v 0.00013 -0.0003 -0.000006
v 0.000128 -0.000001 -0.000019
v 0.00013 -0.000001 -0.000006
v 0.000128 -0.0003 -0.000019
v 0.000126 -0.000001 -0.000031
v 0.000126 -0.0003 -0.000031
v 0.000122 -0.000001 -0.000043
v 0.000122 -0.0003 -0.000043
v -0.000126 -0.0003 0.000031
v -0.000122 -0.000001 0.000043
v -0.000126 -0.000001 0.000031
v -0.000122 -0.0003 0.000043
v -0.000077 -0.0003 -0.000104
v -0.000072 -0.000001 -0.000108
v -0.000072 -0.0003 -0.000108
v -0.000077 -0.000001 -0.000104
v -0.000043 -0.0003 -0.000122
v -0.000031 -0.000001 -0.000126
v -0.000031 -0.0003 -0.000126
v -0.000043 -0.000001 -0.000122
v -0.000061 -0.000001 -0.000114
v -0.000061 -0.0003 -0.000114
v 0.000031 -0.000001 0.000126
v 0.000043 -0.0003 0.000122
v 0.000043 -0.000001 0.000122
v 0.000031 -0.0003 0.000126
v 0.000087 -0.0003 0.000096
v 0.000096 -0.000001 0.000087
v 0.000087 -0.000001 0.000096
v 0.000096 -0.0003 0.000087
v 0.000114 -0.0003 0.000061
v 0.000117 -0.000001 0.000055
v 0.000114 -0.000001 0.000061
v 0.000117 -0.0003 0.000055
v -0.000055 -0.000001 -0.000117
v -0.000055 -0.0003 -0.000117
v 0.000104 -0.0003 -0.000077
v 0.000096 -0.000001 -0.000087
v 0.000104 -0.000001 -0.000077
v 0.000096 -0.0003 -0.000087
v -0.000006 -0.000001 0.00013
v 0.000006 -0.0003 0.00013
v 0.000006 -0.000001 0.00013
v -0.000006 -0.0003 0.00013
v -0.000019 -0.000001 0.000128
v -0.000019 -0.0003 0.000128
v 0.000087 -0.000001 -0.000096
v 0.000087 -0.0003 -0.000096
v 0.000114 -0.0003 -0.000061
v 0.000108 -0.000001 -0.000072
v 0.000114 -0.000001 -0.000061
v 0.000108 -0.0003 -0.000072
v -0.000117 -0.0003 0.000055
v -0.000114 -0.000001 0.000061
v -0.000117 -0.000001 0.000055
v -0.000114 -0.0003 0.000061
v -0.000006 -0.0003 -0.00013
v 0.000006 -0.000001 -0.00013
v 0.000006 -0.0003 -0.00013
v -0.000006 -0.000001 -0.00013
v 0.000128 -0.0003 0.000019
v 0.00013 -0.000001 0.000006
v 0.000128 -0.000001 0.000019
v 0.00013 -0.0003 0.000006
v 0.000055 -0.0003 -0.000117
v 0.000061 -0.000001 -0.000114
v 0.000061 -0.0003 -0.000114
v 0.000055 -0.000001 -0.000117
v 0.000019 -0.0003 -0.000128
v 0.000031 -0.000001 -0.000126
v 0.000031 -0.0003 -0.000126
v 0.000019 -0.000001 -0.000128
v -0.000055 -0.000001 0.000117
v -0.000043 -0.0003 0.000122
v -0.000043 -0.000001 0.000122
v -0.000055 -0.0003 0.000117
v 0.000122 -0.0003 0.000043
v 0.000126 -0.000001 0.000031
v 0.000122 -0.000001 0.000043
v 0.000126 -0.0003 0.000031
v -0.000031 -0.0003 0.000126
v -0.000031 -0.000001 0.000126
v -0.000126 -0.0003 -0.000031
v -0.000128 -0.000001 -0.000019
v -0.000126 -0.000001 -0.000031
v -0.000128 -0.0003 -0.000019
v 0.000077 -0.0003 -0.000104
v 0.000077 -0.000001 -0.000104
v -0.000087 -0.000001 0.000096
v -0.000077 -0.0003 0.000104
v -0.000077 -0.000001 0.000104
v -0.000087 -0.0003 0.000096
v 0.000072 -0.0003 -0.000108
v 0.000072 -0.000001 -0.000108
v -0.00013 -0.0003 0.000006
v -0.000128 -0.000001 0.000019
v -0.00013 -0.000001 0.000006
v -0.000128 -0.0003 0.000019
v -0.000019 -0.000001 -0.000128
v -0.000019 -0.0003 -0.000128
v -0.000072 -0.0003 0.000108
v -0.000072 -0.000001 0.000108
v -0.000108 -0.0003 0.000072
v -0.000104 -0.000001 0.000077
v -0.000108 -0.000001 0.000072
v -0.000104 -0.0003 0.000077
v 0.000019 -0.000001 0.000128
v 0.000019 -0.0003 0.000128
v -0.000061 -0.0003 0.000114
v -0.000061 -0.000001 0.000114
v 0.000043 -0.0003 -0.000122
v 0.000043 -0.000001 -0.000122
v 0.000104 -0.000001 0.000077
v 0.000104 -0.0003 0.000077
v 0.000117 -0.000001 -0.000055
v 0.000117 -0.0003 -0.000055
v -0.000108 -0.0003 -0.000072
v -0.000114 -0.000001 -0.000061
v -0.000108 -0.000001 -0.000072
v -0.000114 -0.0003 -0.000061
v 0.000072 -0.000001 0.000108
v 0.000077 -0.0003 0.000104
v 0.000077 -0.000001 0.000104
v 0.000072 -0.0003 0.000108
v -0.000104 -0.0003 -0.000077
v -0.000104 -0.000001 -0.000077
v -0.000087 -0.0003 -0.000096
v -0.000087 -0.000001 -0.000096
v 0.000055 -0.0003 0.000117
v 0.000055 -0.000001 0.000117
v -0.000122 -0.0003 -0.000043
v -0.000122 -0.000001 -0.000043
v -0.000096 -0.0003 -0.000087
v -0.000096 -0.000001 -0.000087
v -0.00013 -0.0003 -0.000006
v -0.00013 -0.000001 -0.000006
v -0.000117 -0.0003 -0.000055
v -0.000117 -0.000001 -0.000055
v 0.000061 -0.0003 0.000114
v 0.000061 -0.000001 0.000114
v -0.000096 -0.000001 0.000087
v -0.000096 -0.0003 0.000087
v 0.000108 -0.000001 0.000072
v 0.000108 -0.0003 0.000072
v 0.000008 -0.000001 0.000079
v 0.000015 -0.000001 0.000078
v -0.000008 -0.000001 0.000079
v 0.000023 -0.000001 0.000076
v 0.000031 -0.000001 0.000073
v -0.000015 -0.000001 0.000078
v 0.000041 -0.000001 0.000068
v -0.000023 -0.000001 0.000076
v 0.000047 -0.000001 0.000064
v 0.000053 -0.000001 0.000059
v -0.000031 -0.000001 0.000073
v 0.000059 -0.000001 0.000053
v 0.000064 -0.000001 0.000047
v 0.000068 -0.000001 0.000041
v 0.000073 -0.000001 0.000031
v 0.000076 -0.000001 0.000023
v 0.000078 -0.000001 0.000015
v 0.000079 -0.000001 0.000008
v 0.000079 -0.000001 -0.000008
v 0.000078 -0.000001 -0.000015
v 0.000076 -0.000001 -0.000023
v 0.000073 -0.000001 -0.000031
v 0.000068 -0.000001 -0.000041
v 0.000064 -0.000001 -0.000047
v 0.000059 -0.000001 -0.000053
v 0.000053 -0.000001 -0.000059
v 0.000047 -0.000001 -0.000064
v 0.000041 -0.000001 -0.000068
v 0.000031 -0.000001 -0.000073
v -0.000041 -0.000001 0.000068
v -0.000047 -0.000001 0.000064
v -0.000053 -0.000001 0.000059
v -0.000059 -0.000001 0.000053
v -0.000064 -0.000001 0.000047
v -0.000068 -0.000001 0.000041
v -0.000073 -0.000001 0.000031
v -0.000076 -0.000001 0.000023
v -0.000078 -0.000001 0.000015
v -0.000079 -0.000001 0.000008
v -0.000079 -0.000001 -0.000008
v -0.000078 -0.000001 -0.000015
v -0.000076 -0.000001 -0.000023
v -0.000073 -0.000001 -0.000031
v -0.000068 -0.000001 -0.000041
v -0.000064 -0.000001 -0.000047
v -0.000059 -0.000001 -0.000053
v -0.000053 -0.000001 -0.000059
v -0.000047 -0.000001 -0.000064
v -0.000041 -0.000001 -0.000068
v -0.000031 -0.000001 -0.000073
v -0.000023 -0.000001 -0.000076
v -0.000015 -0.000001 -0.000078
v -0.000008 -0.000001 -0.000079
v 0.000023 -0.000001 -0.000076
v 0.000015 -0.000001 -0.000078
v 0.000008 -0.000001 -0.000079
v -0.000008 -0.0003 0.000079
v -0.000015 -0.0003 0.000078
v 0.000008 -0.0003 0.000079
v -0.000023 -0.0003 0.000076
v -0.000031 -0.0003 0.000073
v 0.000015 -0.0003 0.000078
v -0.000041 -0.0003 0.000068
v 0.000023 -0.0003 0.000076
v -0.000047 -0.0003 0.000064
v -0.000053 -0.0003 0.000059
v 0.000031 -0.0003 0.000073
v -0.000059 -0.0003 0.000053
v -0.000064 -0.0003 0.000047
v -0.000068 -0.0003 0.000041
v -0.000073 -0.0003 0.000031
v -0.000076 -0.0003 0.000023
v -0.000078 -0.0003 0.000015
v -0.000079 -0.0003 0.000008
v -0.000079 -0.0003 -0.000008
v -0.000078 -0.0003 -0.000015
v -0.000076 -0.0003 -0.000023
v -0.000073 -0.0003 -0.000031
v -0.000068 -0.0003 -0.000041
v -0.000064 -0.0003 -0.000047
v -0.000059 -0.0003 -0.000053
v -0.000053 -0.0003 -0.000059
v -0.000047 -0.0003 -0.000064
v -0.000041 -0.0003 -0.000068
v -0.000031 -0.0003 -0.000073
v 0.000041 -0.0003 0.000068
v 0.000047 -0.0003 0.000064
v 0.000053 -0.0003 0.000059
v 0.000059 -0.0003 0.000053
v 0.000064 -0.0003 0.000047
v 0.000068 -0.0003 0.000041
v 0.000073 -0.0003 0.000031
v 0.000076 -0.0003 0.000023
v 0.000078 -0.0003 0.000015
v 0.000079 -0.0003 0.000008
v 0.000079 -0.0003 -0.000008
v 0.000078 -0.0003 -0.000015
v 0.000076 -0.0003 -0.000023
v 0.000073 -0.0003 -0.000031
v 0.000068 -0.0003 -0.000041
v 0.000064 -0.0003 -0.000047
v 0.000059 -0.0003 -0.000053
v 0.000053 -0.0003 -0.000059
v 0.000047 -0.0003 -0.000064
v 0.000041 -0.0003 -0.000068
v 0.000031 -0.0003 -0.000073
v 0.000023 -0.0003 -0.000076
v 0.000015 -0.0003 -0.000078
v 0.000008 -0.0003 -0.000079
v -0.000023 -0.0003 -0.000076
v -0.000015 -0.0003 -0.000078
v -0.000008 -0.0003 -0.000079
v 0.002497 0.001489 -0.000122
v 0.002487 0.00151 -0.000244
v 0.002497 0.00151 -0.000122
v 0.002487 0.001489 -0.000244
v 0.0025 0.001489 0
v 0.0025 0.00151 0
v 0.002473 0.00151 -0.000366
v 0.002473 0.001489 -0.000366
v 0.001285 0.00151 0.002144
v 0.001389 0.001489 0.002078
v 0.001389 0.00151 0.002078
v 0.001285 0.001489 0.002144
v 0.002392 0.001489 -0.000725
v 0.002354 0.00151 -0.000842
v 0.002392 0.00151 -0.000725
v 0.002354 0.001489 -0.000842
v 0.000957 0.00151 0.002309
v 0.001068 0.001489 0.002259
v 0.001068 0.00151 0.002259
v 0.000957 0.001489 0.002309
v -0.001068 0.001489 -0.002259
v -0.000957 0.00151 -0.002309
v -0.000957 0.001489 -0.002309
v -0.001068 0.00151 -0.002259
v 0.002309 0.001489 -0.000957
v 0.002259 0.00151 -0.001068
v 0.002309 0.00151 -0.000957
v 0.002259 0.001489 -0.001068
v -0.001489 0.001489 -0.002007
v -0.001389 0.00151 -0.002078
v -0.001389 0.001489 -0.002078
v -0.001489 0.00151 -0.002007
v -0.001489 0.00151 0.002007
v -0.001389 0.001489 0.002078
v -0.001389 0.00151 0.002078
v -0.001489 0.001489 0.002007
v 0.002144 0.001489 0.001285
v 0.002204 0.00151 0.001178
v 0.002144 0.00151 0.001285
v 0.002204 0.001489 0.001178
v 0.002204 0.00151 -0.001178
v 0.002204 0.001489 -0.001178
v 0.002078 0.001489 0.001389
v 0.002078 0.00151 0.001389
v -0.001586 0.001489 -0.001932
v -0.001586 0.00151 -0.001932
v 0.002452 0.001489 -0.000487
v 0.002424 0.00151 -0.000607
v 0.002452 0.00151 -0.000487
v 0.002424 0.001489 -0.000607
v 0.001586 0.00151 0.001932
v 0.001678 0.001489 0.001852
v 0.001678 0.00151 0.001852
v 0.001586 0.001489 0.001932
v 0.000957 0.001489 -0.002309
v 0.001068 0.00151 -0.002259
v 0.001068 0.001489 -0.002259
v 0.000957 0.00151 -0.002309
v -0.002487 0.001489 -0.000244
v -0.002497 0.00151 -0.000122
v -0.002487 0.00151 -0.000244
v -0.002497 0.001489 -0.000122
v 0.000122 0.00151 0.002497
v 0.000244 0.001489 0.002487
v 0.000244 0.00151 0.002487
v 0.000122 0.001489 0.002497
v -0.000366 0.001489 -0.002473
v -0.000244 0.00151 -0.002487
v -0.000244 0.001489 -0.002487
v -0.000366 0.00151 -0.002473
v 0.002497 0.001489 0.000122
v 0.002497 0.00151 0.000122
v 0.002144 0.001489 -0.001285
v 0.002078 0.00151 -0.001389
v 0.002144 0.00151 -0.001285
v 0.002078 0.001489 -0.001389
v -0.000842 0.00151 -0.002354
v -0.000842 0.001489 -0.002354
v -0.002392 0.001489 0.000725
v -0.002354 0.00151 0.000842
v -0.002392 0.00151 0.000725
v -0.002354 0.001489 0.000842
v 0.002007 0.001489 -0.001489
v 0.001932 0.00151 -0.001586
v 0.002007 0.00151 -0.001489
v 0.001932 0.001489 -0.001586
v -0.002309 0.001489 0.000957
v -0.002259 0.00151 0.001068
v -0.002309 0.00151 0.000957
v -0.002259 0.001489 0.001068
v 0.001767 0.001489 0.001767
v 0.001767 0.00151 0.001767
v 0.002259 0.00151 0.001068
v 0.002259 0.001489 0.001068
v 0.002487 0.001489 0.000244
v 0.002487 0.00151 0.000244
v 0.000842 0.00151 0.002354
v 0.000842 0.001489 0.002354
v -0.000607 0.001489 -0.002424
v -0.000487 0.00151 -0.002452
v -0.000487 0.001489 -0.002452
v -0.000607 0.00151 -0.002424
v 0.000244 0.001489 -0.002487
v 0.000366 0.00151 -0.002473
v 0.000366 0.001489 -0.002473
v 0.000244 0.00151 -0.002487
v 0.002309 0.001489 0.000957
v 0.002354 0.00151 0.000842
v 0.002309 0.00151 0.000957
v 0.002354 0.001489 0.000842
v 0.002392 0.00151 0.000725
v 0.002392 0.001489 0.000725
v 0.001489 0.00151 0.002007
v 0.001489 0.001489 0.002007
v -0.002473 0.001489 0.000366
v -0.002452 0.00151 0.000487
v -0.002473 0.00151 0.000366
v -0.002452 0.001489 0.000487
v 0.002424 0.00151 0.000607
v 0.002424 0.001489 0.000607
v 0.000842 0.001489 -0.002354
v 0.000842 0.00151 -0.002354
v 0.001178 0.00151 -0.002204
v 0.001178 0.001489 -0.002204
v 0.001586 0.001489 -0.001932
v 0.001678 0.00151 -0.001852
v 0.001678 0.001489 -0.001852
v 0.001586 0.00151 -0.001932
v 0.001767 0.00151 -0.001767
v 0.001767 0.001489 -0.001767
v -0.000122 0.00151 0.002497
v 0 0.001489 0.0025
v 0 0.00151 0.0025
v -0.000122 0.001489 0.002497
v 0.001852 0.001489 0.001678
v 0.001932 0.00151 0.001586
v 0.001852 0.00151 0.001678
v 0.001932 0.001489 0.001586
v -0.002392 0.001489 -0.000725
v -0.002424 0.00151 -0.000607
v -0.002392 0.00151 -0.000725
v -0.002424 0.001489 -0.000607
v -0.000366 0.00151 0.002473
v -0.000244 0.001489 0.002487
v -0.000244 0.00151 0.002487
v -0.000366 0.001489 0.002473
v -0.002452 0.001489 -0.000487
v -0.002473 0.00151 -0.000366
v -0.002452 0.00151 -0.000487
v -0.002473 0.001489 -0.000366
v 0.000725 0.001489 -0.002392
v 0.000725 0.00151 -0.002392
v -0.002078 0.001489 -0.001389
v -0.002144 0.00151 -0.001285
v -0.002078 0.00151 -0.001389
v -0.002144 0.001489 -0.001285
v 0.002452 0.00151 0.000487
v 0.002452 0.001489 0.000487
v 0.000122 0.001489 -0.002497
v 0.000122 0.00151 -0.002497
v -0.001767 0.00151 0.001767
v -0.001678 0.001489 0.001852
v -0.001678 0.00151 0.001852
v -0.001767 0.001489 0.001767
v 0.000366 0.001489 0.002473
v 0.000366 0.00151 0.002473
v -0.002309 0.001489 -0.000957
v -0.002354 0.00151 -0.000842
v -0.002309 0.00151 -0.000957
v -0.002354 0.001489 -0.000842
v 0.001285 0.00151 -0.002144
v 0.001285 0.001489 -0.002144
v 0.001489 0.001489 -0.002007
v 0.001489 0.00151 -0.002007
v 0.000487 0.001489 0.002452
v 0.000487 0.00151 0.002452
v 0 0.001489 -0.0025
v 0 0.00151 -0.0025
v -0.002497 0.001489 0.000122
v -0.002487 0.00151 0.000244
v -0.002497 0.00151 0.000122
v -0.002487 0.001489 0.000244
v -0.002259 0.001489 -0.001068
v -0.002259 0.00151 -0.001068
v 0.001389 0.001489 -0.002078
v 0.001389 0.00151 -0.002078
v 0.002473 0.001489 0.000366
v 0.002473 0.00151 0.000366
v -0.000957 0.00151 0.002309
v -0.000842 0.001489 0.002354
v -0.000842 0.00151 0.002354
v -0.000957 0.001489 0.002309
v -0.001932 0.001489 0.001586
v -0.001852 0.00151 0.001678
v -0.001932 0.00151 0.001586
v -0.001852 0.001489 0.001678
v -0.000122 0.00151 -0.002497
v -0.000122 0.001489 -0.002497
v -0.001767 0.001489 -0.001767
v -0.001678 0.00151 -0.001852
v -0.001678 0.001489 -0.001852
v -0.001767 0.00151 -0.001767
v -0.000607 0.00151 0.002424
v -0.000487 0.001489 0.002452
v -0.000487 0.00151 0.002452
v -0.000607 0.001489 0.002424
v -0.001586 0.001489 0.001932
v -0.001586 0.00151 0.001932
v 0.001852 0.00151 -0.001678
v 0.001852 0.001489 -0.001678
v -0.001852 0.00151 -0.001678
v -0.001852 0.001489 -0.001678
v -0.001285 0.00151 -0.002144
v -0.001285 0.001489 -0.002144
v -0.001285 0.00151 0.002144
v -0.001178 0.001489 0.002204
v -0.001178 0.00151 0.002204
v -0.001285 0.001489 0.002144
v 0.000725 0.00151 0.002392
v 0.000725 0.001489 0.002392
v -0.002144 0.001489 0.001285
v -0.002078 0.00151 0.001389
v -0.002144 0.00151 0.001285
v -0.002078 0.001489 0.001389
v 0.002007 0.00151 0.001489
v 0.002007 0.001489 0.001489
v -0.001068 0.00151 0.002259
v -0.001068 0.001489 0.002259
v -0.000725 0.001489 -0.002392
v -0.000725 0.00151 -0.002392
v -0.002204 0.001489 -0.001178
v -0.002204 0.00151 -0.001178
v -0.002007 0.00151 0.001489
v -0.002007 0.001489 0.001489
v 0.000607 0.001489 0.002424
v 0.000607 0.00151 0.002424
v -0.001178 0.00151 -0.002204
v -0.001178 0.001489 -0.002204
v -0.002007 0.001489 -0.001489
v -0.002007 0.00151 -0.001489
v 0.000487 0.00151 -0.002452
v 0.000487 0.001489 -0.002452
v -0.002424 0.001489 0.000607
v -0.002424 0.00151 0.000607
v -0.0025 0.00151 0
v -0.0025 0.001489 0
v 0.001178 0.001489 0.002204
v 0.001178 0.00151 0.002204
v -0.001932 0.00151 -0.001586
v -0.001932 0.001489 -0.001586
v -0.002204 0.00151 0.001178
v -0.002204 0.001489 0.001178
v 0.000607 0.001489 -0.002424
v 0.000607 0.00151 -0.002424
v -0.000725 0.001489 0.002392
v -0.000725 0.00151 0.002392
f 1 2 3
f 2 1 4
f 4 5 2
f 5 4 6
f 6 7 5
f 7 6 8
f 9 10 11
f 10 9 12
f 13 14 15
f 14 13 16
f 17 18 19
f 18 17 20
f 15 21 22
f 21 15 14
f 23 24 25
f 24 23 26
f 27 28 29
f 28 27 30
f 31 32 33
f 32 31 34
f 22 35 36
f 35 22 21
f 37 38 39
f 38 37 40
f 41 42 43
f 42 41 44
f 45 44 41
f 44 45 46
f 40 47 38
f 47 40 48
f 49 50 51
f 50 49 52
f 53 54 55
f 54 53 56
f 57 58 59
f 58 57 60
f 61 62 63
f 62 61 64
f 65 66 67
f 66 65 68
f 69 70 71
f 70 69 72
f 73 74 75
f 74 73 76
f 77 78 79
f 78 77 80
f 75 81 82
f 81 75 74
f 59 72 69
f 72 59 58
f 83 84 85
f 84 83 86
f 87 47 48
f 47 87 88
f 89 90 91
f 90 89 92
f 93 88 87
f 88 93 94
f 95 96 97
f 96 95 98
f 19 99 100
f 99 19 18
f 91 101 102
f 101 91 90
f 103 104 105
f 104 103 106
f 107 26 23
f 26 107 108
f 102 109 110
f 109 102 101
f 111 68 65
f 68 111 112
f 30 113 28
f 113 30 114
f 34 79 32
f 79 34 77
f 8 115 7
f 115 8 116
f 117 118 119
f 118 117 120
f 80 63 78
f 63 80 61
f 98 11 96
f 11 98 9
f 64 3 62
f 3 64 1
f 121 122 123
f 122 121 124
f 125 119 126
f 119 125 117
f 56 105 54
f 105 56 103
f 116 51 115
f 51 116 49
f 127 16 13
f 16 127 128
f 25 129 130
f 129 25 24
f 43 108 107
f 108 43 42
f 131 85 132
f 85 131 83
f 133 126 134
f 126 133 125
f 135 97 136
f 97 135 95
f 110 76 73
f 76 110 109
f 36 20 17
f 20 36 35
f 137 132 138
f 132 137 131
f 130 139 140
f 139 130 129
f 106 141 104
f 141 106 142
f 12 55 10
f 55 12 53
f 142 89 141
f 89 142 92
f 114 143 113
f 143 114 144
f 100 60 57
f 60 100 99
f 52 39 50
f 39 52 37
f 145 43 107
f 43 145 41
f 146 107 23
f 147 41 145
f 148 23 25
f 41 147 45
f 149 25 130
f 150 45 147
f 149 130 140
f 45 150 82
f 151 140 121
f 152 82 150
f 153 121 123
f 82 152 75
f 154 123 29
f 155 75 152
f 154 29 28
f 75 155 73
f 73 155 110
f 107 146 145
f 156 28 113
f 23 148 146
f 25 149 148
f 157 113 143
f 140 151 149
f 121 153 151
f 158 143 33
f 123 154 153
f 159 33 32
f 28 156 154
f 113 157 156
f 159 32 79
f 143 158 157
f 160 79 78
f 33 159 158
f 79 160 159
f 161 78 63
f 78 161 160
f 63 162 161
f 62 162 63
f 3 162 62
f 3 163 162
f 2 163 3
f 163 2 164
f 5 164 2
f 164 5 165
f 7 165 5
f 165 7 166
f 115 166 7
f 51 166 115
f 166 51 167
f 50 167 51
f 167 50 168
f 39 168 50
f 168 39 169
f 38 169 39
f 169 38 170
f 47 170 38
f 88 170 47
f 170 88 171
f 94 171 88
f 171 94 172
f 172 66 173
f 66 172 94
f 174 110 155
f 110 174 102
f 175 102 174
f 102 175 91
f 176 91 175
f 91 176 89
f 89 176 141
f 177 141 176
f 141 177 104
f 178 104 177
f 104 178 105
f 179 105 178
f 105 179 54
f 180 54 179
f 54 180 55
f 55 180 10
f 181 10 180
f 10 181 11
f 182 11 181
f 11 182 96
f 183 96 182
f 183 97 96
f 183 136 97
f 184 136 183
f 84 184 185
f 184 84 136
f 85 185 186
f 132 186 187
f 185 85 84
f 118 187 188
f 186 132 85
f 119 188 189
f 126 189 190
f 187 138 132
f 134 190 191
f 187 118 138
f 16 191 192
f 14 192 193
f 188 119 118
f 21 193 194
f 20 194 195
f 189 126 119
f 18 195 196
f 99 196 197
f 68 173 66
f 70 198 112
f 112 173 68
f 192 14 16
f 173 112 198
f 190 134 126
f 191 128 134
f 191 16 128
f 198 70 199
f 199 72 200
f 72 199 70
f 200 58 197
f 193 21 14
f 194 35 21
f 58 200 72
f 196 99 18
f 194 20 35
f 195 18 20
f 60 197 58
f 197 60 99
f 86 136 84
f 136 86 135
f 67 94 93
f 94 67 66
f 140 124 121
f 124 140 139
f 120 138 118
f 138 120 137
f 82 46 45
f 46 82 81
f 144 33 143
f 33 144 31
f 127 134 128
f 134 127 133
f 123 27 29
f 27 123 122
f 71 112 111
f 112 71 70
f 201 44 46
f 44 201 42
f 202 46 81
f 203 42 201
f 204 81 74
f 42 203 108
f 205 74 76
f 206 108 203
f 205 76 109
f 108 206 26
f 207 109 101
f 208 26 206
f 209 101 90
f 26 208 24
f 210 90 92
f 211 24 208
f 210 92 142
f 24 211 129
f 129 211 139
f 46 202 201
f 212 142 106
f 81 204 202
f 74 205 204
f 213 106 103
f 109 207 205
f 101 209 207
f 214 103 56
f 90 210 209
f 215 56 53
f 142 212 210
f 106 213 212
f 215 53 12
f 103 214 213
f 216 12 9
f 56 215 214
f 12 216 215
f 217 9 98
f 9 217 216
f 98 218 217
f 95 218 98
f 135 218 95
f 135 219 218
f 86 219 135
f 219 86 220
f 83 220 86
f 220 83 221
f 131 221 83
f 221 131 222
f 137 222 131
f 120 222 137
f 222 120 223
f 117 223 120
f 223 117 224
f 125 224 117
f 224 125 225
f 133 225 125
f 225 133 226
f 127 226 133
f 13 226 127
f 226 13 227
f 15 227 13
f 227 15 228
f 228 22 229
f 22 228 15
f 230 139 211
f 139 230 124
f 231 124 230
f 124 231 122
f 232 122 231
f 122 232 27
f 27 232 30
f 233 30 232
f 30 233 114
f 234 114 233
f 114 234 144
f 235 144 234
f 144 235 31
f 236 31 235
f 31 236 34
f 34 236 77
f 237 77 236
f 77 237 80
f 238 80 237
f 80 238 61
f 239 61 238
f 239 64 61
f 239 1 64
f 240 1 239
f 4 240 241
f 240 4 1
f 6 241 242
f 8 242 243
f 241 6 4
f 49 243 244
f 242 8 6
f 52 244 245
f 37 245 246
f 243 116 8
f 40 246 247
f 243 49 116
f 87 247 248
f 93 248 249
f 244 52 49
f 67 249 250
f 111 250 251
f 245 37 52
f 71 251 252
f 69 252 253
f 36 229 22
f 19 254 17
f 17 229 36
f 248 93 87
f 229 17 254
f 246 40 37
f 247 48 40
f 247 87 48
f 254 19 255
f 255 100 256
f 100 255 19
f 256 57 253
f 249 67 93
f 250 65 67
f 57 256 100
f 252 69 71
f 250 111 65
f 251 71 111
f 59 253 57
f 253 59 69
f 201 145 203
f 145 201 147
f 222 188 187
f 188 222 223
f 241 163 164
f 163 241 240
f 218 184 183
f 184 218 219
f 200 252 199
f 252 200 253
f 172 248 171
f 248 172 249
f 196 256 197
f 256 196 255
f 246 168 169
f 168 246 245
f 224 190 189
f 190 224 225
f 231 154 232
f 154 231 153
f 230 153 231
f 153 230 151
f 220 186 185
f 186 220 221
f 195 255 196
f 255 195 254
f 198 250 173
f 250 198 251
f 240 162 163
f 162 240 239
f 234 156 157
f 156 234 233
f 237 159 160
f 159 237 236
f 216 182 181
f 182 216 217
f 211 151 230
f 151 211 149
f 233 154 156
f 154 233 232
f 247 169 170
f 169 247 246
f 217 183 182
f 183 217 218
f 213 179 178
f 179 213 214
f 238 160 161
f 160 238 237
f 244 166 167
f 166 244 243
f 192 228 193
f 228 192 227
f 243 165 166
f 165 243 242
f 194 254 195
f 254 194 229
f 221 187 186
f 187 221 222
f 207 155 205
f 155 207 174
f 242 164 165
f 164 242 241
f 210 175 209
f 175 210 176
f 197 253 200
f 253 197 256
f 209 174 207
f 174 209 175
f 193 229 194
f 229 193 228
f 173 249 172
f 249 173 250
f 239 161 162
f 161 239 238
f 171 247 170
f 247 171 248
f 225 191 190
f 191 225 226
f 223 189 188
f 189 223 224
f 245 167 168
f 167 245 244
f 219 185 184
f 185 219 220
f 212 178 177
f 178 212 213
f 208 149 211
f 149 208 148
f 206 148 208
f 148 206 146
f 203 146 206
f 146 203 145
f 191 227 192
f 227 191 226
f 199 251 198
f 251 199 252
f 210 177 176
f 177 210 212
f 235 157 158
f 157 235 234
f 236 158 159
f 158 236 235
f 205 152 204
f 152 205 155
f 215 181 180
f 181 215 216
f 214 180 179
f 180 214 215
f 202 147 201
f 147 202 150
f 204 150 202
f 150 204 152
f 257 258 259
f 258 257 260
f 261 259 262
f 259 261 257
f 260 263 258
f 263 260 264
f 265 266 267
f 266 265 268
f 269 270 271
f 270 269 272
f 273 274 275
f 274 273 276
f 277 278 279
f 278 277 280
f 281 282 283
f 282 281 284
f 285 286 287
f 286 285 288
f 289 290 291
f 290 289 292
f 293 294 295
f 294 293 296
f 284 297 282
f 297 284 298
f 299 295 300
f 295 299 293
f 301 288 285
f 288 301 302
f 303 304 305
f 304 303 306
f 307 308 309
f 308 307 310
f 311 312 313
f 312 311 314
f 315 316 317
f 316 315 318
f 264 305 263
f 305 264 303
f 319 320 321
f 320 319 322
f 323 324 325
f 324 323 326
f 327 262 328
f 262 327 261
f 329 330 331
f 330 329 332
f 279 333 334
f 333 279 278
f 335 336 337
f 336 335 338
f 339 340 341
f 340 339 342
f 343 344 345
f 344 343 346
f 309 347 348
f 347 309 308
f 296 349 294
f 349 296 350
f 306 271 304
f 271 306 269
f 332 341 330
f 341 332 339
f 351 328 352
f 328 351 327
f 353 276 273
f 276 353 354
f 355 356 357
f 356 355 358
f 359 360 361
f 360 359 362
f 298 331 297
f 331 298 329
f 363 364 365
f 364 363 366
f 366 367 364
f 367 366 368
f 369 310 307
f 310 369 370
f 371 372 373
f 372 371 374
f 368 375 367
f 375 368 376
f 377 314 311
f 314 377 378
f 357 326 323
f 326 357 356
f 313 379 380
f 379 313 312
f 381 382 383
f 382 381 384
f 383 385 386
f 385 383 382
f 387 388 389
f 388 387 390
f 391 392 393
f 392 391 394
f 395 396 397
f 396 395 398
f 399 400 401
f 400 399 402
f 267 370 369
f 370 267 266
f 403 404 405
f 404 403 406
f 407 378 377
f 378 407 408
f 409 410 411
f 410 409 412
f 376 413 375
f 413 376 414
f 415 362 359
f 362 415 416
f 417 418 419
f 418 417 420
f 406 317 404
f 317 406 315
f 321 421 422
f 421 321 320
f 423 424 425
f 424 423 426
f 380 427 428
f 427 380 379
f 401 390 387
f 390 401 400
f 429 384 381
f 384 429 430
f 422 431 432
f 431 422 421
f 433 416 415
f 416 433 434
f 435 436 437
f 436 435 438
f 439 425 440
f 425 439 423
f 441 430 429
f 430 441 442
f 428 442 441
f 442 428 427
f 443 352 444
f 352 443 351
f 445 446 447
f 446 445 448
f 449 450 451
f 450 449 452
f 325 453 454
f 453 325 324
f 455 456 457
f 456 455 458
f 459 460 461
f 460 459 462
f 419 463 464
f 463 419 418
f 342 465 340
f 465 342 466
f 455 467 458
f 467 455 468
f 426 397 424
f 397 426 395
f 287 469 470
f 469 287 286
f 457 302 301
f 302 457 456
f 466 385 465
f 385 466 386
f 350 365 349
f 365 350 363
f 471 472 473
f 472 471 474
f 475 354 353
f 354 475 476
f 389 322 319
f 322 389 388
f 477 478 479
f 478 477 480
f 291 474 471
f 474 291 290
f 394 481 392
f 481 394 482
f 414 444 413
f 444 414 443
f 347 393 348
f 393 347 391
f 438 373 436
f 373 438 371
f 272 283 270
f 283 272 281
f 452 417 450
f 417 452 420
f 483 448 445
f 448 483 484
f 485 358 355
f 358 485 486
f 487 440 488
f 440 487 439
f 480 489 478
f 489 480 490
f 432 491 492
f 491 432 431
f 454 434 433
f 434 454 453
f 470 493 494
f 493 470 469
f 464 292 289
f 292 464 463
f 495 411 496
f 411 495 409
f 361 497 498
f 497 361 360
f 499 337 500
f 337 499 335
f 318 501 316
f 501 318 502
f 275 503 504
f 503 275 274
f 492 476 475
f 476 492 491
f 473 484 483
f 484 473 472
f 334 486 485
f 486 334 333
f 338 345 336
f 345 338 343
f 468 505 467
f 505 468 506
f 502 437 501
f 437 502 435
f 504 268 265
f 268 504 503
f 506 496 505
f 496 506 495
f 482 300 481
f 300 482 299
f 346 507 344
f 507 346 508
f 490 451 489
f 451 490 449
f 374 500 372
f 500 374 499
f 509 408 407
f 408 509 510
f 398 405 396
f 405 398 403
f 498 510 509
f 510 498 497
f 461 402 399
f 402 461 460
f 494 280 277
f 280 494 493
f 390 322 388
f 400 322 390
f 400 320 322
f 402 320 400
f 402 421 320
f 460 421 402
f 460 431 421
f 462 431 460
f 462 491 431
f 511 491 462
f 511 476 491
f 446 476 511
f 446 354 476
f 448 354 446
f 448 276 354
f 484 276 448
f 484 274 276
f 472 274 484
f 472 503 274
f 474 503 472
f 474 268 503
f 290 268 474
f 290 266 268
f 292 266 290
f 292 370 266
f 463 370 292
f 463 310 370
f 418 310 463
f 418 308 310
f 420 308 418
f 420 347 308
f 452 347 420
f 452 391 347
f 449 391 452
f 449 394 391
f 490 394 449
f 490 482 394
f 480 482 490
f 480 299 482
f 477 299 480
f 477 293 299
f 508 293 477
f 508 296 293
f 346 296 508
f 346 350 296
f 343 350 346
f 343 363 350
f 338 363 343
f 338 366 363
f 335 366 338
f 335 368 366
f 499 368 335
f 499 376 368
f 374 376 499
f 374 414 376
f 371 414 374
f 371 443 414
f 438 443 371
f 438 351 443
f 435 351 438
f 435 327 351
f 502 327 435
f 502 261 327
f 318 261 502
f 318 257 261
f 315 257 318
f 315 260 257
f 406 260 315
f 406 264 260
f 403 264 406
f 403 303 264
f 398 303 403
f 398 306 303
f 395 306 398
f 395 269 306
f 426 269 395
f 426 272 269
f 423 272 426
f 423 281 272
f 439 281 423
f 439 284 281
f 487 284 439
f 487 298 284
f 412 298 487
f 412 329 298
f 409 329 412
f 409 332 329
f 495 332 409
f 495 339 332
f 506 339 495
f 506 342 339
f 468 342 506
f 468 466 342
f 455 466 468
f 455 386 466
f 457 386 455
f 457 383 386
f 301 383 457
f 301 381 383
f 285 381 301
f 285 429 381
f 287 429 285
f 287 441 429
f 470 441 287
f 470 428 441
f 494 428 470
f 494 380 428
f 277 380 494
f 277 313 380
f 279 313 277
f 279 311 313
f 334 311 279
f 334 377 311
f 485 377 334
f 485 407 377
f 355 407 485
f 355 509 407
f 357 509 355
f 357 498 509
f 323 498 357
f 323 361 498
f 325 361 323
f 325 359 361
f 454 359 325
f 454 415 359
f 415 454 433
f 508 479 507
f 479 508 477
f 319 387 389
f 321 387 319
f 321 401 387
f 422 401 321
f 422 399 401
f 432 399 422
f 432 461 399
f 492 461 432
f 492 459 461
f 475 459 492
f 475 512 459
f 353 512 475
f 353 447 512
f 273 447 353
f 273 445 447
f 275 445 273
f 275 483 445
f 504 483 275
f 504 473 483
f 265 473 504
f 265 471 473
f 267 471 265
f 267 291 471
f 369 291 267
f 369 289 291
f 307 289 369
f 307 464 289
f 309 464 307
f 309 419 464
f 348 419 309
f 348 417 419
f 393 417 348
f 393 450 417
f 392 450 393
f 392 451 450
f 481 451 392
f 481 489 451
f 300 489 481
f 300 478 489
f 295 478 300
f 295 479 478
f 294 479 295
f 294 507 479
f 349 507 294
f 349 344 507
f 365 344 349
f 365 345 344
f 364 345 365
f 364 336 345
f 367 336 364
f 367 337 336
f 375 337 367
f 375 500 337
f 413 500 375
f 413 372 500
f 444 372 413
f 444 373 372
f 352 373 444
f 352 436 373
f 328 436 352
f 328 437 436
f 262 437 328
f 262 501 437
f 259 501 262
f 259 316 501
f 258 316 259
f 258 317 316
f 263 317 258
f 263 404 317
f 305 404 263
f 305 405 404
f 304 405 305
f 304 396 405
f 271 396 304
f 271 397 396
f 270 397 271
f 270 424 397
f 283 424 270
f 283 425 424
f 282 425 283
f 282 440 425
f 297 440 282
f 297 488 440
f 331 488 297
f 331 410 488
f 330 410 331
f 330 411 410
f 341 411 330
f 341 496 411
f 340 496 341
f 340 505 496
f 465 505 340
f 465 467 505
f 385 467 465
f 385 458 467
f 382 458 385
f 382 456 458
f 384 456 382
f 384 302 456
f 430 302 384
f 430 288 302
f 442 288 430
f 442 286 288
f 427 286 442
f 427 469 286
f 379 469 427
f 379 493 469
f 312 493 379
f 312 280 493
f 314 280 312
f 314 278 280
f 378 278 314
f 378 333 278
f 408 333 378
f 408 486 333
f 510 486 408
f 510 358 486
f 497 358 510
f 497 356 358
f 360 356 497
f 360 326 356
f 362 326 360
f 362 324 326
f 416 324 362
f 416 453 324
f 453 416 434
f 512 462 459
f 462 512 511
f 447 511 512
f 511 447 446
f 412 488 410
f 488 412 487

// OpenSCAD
// Parametric electrospray nozzle/collector geometry.
// Units are meters; OpenSCAD will display them as model units.
inner_diameter = 0.00016;
outer_diameter = 0.00026;
nozzle_length = 0.0003;
collector_distance = 0.0015;
collector_diameter = 0.005;
farfield_radius = 0.0025;
$fn = 128;

module nozzle_electrode() {
  translate([0, -nozzle_length, 0]) rotate([-90,0,0])
  difference() {
    cylinder(h=nozzle_length, d=outer_diameter);
    translate([0,0,-1e-9]) cylinder(h=nozzle_length + 2e-9, d=inner_diameter);
  }
}

module collector_ground() {
  translate([0, collector_distance, 0]) rotate([-90,0,0])
    cylinder(h=outer_diameter*0.08, d=collector_diameter, center=true);
}

module open_atmosphere_hint() {
  %translate([0, (-nozzle_length + collector_distance)/2, 0]) rotate([-90,0,0])
    cylinder(h=nozzle_length + collector_distance, r=farfield_radius);
}

nozzle_electrode();
collector_ground();
open_atmosphere_hint();
